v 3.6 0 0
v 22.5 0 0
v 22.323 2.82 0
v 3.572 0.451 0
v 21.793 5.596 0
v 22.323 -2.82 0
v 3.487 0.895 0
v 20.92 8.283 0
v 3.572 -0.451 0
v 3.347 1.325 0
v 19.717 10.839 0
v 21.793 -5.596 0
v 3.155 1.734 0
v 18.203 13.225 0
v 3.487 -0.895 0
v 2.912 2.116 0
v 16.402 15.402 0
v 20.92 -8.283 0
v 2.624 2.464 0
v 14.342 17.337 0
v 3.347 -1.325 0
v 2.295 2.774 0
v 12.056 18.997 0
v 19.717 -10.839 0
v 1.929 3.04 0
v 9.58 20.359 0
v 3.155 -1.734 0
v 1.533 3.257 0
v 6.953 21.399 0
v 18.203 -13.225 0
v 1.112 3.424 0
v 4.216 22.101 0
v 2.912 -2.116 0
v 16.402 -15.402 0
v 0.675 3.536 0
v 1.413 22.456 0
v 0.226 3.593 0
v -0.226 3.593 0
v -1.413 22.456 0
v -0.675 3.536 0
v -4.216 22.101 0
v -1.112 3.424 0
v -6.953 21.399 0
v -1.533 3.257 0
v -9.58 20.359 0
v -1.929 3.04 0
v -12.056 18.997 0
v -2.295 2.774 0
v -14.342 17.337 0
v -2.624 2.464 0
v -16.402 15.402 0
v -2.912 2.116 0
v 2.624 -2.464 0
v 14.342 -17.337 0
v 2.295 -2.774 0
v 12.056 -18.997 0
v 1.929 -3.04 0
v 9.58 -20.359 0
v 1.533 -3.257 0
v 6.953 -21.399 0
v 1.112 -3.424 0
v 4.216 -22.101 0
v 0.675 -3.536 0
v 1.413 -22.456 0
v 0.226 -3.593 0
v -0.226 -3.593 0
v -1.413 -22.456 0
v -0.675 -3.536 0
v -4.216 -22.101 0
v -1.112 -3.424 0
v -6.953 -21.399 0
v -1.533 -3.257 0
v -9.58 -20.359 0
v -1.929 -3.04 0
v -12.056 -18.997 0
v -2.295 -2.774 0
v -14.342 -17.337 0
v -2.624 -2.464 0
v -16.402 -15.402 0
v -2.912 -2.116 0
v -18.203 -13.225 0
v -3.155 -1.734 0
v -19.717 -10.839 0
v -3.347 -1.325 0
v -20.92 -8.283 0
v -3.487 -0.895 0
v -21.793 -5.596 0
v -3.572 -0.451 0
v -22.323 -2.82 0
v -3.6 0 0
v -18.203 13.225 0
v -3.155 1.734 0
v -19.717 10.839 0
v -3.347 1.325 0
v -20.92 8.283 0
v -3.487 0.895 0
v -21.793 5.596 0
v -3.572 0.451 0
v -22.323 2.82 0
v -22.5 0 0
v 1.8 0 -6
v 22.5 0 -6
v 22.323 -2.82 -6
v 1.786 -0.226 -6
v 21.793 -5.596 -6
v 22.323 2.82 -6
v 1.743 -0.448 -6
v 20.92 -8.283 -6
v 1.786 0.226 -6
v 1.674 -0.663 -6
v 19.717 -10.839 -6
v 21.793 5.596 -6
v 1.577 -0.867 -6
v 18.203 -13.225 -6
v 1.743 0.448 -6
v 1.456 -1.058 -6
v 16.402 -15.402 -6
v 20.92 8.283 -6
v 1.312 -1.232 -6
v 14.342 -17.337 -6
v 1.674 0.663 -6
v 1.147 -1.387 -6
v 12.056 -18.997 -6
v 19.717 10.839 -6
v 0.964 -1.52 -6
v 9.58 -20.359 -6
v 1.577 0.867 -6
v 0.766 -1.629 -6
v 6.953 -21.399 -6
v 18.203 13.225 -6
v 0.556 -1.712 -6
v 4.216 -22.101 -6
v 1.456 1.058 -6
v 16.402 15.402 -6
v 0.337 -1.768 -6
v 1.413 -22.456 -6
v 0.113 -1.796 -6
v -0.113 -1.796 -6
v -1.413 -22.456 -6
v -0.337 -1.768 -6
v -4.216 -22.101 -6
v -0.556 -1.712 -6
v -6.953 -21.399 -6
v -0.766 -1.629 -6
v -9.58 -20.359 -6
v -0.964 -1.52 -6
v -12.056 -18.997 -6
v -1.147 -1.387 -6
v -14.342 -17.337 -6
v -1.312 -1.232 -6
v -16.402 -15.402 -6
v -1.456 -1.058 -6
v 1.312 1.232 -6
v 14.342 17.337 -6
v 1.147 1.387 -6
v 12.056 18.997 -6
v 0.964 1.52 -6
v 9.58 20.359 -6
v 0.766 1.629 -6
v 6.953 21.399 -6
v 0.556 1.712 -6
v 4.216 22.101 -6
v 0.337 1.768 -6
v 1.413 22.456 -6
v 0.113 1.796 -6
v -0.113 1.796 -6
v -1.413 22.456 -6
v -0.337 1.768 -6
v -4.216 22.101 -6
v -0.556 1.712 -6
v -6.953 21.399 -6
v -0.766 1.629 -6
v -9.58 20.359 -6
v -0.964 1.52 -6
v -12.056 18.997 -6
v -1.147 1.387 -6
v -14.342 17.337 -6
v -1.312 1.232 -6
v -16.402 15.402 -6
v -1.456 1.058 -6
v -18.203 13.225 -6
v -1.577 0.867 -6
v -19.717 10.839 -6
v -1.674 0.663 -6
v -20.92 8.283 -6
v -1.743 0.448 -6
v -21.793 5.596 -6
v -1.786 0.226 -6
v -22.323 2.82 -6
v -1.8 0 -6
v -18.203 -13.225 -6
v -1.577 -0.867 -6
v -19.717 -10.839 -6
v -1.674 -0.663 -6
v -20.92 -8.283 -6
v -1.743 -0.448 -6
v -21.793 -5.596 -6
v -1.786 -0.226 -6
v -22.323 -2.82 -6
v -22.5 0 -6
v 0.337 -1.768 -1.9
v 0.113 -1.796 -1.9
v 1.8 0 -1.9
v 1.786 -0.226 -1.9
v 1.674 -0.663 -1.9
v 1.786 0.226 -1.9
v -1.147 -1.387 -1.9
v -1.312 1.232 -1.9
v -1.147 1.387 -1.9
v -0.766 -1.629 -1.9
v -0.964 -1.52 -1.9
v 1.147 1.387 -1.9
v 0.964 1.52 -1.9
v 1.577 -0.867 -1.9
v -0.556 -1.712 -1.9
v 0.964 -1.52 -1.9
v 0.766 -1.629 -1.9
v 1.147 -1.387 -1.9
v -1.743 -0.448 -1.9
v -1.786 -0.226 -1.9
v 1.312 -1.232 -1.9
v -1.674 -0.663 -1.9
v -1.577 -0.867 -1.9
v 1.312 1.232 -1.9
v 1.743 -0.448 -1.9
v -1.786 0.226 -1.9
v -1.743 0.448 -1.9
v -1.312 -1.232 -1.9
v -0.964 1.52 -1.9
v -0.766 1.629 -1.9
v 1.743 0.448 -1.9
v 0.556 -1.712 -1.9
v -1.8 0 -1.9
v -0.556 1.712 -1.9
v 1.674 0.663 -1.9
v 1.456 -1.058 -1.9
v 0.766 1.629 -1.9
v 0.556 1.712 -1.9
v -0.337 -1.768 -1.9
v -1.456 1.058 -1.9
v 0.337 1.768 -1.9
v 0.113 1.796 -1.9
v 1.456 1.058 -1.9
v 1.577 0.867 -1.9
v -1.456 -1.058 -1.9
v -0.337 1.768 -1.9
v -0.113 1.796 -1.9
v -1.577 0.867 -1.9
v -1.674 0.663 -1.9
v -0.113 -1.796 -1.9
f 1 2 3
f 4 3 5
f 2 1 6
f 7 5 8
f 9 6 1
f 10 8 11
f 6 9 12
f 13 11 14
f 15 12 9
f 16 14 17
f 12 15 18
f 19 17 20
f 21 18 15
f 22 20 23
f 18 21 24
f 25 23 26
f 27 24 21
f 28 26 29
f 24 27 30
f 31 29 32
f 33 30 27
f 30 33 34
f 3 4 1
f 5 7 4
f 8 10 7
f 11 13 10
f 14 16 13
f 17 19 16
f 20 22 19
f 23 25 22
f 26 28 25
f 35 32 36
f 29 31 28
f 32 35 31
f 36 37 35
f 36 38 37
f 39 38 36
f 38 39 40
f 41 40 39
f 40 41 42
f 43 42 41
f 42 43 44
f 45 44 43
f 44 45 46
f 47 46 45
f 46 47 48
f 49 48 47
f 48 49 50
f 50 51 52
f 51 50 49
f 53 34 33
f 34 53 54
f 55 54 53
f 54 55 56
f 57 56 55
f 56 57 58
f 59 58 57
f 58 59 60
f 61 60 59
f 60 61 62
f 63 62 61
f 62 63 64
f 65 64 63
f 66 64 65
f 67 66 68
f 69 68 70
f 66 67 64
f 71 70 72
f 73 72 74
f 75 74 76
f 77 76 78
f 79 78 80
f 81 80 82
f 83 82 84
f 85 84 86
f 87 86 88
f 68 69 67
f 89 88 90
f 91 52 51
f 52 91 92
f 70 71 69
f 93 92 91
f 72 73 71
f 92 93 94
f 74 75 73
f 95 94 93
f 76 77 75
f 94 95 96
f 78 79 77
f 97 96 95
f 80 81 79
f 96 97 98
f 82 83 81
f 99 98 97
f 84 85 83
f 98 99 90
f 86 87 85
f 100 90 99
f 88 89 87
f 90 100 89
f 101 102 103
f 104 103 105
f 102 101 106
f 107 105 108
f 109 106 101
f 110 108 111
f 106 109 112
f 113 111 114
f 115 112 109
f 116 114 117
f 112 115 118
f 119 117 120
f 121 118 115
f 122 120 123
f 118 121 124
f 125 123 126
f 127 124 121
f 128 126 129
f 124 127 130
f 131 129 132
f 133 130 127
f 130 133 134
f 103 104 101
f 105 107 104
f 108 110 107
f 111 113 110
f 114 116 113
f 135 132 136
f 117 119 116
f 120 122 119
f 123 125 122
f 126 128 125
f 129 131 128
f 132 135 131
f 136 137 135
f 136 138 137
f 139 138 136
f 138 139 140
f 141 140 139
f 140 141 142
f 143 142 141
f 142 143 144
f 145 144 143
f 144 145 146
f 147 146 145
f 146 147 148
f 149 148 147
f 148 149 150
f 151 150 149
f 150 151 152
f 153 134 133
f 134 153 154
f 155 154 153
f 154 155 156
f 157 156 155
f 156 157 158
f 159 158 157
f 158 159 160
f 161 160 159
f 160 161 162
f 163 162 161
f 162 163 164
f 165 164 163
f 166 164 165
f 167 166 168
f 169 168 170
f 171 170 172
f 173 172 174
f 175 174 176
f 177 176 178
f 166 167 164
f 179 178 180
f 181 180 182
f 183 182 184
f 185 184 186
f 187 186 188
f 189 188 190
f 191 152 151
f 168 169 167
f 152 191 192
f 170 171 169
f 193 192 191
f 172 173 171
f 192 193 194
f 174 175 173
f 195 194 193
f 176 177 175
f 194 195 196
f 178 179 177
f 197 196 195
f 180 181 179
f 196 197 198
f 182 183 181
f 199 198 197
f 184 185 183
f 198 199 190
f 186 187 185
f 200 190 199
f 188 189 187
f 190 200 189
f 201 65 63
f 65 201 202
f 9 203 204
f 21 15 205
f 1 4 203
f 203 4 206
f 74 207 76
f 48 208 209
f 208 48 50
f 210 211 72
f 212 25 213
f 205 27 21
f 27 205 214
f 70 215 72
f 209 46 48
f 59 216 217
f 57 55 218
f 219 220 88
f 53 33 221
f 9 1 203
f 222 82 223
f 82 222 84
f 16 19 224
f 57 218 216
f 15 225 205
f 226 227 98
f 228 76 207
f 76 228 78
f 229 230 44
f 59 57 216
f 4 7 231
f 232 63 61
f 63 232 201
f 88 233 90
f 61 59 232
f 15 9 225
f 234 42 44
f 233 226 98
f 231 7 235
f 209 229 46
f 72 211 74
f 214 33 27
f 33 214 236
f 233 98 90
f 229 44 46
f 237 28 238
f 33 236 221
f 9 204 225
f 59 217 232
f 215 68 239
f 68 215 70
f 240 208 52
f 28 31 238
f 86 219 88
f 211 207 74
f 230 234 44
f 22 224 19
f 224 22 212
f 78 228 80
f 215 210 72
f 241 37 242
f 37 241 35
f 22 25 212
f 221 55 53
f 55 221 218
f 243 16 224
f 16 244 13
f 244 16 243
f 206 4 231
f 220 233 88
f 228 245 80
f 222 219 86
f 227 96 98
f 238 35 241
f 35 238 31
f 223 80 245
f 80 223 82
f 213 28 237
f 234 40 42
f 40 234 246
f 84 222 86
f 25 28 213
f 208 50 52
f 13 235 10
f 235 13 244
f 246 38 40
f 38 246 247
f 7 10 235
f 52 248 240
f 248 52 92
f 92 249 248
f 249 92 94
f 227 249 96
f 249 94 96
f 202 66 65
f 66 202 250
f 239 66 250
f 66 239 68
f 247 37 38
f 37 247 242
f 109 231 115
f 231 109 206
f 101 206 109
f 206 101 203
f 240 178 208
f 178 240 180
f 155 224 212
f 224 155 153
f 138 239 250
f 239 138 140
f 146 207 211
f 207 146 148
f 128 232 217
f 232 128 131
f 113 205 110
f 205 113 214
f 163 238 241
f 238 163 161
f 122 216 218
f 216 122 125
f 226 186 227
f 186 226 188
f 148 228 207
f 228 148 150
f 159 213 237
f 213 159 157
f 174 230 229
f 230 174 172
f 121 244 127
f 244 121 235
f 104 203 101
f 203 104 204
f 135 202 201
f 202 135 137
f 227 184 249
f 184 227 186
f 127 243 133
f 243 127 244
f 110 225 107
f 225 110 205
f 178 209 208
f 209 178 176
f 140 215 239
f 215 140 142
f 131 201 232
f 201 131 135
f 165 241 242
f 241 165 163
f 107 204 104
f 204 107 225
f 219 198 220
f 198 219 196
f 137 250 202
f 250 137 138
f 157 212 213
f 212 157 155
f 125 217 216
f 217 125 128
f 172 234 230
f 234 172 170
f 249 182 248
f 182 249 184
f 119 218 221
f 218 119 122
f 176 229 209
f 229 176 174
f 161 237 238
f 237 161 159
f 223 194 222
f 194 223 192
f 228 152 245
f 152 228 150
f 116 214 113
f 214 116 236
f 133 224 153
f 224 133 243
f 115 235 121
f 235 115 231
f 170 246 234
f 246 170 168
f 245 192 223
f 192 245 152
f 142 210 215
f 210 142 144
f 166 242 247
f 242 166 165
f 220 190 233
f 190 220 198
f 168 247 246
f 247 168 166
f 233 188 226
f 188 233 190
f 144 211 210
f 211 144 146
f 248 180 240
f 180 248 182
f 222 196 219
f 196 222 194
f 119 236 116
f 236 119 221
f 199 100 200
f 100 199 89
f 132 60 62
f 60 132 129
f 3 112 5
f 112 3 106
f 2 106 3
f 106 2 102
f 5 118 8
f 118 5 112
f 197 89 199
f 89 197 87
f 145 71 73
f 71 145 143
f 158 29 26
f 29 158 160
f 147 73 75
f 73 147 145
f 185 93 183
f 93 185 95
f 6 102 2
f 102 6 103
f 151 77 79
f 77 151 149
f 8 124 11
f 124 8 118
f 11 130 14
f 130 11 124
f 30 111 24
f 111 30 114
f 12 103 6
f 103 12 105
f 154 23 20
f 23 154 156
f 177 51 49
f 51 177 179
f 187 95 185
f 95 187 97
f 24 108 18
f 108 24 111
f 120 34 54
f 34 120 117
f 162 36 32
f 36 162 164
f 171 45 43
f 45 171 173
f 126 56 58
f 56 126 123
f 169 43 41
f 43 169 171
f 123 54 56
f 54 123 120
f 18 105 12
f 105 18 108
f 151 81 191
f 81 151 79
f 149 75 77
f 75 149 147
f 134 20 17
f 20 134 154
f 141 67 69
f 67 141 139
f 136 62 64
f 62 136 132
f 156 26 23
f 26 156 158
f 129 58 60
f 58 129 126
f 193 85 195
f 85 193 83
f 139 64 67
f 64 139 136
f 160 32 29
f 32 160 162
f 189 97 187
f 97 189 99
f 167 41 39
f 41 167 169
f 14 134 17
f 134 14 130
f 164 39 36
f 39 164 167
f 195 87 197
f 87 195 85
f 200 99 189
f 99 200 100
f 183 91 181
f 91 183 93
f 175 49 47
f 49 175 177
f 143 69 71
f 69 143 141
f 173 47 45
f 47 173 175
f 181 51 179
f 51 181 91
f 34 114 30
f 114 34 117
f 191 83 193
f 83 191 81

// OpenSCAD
$fn = 50;


difference() {
	union() {
		translate(v = [0, 0, -6.0000000000]) {
			cylinder(h = 6, r = 22.5000000000);
		}
	}
	union() {
		translate(v = [0, 0, 0]) {
			rotate(a = [0, 0, 0]) {
				difference() {
					union() {
						translate(v = [0, 0, -6.0000000000]) {
							cylinder(h = 6, r = 1.5000000000);
						}
						translate(v = [0, 0, -1.9000000000]) {
							cylinder(h = 1.9000000000, r1 = 1.8000000000, r2 = 3.6000000000);
						}
						translate(v = [0, 0, -6.0000000000]) {
							cylinder(h = 6, r = 1.8000000000);
						}
						translate(v = [0, 0, -6.0000000000]) {
							cylinder(h = 6, r = 1.5000000000);
						}
					}
					union();
				}
			}
		}
	}
}
